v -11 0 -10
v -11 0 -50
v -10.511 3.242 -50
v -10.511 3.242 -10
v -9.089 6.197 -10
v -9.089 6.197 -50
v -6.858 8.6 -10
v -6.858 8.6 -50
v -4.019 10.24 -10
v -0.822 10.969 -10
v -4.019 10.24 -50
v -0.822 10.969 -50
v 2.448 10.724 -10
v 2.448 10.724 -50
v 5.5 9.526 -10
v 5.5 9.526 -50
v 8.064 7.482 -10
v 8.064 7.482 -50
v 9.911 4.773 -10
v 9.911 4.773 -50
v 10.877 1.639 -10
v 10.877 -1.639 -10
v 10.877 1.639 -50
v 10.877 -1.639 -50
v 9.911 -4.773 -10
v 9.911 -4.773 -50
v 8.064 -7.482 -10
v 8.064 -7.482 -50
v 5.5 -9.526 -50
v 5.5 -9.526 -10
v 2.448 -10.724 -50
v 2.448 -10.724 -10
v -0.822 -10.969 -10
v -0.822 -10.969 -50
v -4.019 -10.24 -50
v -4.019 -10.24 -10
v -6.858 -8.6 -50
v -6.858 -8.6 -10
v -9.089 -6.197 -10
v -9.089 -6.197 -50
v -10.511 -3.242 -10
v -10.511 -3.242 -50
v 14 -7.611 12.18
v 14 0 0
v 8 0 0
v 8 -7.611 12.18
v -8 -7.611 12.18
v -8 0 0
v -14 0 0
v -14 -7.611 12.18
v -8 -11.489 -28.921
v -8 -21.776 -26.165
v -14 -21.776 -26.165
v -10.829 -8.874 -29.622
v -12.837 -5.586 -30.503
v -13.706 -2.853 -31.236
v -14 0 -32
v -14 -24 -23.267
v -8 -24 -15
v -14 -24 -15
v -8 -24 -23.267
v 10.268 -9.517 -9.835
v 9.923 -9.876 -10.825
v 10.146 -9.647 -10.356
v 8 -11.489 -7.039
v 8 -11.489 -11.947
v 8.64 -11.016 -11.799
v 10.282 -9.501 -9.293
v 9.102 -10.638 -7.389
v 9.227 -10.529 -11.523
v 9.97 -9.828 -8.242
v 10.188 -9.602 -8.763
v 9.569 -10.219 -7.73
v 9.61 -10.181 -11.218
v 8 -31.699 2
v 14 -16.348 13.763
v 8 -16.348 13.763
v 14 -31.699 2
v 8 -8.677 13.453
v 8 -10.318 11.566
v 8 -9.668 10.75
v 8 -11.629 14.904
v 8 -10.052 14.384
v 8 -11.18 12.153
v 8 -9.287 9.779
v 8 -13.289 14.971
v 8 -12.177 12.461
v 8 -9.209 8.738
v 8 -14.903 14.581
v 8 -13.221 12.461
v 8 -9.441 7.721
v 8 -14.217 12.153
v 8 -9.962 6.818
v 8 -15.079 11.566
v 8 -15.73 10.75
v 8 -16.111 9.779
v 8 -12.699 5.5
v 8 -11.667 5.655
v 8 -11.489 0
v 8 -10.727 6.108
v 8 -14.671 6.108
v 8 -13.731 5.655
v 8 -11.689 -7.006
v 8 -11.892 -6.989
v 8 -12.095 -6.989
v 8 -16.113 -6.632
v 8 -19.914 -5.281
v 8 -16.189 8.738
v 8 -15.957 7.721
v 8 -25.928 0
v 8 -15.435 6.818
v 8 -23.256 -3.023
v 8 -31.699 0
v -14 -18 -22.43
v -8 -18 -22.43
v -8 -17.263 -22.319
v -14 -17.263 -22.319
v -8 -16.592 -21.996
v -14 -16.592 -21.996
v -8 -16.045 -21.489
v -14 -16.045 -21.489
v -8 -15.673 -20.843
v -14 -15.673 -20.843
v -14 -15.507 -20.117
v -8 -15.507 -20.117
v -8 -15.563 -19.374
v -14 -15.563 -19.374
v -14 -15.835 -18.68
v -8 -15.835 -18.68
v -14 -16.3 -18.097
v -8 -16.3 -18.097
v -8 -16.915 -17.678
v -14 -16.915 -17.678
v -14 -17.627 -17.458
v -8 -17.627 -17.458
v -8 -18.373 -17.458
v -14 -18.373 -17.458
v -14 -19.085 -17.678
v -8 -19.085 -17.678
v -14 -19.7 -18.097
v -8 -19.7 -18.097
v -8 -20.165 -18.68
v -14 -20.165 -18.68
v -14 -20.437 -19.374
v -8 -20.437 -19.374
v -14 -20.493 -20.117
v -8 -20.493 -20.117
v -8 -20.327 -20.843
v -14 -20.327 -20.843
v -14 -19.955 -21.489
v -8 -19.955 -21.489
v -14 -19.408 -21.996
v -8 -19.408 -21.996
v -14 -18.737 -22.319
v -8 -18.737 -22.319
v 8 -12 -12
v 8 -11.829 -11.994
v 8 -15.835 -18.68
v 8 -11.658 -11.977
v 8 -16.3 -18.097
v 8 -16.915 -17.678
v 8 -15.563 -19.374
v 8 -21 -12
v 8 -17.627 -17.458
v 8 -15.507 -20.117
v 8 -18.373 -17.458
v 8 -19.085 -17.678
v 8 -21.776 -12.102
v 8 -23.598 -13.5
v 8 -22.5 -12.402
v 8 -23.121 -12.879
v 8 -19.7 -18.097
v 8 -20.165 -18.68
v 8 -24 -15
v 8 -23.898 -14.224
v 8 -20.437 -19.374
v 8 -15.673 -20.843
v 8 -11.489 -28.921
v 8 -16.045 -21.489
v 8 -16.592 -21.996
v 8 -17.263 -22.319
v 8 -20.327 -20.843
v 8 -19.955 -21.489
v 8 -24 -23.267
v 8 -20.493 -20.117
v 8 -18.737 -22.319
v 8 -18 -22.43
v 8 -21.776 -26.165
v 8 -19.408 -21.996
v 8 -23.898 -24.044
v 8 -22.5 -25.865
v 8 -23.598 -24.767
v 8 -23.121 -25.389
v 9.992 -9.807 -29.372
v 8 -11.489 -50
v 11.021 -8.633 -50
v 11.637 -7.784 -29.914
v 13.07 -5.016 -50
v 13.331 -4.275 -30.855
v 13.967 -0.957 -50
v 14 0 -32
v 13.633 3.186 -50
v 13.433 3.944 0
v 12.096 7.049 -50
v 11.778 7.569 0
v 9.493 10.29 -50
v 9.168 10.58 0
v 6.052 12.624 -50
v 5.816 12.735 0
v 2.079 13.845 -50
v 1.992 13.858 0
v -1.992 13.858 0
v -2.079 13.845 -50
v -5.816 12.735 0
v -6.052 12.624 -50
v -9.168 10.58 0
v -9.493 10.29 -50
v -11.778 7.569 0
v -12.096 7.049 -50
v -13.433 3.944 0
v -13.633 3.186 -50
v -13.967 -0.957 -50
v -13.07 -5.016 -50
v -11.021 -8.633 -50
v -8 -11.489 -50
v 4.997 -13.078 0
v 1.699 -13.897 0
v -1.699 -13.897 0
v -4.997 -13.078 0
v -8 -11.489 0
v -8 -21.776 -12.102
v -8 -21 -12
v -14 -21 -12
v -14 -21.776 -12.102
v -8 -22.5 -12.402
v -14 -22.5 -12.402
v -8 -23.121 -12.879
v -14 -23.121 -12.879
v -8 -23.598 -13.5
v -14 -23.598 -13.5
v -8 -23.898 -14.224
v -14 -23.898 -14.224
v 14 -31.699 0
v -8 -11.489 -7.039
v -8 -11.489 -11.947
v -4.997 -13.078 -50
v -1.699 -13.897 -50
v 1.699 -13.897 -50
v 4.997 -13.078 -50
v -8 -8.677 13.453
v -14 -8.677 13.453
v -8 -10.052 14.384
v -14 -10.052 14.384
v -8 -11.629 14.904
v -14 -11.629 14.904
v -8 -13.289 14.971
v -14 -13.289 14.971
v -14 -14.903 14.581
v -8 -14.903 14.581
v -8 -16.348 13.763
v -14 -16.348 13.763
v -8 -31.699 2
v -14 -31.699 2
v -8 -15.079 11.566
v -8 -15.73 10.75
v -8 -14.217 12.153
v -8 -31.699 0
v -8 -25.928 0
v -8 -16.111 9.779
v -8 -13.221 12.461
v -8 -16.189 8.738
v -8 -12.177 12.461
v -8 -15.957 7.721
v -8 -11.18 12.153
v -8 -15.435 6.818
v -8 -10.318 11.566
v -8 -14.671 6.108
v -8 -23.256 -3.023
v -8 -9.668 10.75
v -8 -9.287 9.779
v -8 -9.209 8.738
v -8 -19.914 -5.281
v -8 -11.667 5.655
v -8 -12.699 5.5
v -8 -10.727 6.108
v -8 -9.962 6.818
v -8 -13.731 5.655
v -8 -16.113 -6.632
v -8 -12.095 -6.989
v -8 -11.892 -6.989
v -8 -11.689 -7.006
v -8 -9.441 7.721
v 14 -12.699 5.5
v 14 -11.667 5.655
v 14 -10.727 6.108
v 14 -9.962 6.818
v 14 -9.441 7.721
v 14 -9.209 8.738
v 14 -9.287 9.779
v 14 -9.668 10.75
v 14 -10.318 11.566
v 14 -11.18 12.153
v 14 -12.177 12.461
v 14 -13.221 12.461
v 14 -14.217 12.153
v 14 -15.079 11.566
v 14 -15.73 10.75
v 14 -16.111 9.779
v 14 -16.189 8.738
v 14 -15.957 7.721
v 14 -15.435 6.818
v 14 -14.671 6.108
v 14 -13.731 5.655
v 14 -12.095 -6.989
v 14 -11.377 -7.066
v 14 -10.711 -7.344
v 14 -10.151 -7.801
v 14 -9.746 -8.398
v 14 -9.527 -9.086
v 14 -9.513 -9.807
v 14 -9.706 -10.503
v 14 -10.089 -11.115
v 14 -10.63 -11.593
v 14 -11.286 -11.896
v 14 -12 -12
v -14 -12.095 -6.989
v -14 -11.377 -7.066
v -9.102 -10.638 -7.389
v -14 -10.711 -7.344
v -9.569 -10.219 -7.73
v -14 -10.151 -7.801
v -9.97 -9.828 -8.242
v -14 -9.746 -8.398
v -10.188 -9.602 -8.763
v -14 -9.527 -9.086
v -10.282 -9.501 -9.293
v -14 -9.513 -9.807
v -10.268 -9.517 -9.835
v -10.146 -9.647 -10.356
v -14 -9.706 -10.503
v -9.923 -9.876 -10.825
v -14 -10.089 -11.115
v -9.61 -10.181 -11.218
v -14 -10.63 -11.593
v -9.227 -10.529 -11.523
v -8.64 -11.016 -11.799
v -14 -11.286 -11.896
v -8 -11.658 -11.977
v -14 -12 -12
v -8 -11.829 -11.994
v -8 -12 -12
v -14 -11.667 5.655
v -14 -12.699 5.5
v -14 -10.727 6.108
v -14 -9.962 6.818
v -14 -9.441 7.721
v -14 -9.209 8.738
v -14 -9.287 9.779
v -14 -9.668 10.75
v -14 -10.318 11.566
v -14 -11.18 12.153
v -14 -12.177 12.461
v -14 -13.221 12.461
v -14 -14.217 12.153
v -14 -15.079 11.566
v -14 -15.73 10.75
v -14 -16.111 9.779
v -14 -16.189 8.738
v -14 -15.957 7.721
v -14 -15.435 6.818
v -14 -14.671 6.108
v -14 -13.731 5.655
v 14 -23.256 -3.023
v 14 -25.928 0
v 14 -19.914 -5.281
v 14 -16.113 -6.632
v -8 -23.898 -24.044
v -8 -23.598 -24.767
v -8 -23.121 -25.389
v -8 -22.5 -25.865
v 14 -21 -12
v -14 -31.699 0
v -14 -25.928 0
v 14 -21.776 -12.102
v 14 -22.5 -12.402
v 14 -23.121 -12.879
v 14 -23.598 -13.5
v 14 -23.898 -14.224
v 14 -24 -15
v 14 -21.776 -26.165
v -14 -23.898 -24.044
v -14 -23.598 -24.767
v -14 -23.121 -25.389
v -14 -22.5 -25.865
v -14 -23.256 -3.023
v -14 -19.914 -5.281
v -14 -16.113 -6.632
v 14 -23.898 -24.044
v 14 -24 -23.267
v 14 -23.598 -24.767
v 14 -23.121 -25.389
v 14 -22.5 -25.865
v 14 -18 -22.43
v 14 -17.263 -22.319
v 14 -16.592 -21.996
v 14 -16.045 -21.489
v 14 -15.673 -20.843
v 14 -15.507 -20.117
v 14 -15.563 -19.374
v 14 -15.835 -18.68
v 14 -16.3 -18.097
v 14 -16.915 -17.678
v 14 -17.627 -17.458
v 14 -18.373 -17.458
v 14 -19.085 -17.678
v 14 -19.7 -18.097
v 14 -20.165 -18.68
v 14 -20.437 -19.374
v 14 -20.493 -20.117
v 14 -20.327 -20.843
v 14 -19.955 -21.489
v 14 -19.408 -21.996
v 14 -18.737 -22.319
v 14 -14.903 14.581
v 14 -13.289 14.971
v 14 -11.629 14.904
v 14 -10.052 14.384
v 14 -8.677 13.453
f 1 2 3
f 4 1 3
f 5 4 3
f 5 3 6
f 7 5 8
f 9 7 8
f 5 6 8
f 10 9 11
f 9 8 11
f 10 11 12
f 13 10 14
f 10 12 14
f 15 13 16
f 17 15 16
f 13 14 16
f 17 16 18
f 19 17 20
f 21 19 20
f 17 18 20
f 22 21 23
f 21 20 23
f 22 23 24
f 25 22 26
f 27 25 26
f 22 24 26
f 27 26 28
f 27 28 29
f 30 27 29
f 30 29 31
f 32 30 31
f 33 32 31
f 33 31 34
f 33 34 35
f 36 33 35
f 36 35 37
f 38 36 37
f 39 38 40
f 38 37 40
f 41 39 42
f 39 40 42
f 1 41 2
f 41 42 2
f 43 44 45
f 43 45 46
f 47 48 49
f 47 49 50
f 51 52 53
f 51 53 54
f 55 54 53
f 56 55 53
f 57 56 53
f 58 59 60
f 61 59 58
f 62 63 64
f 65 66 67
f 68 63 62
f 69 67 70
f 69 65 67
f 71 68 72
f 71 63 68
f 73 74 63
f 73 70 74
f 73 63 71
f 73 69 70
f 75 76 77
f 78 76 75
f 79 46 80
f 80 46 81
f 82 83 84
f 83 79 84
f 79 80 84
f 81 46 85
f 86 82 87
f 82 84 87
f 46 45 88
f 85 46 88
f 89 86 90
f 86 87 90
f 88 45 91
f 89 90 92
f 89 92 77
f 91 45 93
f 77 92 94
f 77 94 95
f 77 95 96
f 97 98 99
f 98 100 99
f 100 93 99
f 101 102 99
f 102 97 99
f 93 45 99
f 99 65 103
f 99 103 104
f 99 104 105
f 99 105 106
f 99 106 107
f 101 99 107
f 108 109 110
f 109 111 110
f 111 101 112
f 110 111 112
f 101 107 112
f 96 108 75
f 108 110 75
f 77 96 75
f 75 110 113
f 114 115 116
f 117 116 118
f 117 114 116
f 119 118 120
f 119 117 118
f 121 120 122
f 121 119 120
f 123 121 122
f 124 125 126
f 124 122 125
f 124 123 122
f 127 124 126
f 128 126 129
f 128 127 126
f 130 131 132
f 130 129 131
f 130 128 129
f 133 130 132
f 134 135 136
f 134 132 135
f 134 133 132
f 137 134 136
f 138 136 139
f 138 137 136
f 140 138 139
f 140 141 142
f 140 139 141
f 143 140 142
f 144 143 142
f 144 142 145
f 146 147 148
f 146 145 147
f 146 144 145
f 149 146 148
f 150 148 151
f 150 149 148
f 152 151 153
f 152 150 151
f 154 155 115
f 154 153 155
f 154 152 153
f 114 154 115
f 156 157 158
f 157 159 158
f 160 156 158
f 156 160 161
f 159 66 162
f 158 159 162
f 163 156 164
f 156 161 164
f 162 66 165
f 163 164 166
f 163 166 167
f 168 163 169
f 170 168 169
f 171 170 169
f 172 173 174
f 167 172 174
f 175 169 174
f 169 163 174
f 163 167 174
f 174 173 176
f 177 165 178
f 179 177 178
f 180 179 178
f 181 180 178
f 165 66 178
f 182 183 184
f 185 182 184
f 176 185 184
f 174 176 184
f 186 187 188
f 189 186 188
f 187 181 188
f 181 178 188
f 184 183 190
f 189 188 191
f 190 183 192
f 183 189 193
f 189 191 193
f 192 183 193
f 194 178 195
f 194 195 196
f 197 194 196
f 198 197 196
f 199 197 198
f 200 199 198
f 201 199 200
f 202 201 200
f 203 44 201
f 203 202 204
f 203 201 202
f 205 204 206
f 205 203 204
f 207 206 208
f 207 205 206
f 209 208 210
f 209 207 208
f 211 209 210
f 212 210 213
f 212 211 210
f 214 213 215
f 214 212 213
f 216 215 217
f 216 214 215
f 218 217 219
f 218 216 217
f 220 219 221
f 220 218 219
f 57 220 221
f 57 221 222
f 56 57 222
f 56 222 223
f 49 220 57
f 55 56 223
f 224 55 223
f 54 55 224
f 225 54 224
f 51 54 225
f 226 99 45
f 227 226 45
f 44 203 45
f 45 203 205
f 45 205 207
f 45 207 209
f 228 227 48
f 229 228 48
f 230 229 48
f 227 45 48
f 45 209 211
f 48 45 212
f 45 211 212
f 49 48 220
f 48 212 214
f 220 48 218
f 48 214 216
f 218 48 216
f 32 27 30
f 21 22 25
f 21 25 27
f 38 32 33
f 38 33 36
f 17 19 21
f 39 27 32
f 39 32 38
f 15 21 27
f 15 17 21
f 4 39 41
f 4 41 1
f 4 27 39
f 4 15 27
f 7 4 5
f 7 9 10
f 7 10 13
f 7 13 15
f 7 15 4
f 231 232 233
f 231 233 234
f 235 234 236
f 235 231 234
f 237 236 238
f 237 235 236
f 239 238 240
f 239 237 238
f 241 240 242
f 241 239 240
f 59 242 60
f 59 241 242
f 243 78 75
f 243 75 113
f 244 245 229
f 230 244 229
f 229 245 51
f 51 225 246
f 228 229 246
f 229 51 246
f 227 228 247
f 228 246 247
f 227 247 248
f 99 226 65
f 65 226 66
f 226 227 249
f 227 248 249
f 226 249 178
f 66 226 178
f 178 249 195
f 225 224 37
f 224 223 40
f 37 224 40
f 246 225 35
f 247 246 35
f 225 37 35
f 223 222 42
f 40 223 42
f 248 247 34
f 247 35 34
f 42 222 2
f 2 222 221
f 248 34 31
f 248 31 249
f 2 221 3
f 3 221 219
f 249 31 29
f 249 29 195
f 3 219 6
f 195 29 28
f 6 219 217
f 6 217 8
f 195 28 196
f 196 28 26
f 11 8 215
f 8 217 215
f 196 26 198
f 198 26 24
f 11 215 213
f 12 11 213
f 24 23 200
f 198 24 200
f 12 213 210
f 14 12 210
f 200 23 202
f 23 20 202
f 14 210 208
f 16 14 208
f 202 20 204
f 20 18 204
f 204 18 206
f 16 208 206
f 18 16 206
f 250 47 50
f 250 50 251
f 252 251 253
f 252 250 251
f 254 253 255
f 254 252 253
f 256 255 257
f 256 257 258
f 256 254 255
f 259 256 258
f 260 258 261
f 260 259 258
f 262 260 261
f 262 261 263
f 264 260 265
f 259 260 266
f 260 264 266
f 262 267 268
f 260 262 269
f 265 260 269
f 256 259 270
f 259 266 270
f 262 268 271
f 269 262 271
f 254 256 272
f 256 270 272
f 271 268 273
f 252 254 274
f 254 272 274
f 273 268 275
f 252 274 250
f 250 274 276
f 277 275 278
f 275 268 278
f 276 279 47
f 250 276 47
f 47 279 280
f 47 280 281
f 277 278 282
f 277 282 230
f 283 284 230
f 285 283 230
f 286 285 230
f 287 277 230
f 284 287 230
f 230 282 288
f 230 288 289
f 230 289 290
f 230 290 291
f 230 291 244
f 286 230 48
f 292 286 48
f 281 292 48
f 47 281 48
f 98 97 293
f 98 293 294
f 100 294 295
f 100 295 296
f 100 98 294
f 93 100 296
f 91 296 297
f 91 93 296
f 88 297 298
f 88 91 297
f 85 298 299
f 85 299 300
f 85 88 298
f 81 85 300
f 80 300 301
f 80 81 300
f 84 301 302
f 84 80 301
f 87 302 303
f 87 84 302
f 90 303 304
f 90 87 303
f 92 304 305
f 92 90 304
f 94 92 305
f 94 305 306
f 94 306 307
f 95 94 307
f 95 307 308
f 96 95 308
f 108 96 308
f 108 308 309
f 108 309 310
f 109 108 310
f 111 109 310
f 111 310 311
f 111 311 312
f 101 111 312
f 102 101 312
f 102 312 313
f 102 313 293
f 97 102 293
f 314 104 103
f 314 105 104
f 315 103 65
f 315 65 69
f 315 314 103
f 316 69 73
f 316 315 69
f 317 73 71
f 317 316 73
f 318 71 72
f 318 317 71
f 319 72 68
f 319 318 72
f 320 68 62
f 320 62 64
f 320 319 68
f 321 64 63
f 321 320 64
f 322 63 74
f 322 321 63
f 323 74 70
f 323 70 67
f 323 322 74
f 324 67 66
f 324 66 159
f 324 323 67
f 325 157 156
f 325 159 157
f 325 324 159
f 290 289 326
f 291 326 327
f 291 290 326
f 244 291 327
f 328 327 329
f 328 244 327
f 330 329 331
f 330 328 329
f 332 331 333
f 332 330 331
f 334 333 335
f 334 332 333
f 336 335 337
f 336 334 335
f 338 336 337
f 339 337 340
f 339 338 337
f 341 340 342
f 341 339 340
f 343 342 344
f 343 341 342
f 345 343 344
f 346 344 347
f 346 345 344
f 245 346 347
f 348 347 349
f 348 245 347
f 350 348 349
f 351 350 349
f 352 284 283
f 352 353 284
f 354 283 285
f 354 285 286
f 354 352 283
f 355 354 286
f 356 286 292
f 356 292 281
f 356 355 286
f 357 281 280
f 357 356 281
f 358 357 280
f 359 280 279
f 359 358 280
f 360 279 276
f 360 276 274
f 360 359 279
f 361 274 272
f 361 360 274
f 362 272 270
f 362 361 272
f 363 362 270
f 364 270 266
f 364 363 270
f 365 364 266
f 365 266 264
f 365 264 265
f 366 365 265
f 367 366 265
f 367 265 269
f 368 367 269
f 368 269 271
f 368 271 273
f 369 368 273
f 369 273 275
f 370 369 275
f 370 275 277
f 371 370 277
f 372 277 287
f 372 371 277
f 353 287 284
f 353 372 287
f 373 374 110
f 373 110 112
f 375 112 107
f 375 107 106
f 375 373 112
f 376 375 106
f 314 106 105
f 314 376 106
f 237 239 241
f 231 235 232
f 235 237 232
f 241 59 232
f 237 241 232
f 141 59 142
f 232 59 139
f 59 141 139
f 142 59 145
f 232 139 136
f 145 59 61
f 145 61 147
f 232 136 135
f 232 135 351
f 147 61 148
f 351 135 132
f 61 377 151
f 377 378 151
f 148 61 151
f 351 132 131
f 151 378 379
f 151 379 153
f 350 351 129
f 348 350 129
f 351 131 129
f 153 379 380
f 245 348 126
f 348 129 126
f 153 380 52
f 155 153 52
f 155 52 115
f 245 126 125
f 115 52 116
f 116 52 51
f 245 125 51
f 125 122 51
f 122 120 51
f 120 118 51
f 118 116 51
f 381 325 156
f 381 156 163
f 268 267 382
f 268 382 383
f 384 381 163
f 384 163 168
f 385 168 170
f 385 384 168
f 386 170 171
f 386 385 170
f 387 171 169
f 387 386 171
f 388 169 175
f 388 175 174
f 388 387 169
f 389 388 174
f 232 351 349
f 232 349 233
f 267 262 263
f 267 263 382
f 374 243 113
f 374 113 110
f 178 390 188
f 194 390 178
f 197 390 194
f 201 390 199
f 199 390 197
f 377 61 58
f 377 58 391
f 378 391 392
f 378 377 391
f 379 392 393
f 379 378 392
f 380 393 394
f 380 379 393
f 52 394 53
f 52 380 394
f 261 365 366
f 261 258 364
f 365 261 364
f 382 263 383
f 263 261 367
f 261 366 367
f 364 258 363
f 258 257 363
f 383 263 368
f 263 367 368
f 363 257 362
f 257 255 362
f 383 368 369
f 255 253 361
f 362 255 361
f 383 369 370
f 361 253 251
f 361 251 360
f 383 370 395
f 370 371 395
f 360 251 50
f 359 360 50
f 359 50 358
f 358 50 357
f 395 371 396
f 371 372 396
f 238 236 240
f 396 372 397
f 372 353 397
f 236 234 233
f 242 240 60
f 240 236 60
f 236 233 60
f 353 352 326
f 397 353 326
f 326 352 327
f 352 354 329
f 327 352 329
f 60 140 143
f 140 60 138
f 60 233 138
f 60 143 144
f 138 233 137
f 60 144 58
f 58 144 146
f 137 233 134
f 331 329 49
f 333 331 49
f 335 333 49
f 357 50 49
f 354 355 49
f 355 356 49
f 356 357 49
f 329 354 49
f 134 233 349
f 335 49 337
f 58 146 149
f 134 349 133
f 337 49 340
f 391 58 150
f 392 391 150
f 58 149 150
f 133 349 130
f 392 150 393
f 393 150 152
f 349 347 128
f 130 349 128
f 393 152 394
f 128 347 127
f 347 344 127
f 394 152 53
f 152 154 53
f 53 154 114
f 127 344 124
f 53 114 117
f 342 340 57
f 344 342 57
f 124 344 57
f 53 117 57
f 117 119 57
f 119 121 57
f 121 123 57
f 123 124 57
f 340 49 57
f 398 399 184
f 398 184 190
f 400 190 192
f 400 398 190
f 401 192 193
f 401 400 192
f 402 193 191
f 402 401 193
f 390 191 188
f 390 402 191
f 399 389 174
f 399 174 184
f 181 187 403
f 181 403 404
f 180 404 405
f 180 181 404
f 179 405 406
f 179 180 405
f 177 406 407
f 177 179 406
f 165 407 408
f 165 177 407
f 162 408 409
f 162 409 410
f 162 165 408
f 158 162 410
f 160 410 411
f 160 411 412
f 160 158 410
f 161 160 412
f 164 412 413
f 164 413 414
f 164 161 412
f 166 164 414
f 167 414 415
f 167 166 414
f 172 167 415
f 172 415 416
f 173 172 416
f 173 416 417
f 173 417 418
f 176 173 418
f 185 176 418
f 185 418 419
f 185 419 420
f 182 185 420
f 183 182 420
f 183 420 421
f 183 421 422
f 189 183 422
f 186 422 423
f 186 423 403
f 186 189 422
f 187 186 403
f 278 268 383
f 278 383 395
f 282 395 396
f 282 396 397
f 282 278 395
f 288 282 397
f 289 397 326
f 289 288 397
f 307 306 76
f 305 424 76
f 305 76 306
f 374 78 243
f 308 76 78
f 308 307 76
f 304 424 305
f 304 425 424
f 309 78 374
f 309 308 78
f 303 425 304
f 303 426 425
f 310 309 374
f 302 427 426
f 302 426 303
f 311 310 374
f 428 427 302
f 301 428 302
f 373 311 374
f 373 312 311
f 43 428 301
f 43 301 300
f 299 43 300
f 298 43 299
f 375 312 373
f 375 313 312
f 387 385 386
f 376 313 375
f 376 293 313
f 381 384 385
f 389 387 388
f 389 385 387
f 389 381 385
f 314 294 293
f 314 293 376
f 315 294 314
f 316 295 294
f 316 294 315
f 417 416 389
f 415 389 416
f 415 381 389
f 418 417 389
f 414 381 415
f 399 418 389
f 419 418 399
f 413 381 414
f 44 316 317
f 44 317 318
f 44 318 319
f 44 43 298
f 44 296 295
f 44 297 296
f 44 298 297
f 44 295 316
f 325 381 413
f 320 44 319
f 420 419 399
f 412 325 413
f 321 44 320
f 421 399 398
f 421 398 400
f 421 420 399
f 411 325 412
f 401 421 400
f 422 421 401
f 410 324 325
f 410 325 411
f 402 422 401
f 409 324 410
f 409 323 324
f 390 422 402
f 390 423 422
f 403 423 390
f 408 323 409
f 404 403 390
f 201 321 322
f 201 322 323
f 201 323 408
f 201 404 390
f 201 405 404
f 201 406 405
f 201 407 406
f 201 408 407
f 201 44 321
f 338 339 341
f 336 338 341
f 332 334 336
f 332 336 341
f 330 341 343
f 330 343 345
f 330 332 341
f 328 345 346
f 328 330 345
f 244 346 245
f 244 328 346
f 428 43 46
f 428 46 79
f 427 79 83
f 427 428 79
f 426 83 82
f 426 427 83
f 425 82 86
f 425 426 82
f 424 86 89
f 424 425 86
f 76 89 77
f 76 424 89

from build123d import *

# Parameters (mm, degrees)
SKETCH1_R               = 14
BOSS_EXTRUDE1_DEPTH     = 50
SKETCH2_R               = 3.5
SKETCH2_R_2             = 2.5
BOSS_EXTRUDE2_DEPTH     = 14
CUT_EXTRUDE3_DEPTH      = 61.834364638
CUT_EXTRUDE3_DEPTH_BACK = 61.834364638
CUT_EXTRUDE4_START      = 57
CUT_EXTRUDE4_DEPTH      = 57
SKETCH6_R               = 11
CUT_EXTRUDE5_DEPTH      = 40


with BuildPart() as part:
    # Sketch1 → Boss-Extrude1 (new body)
    with BuildSketch(Plane.XY):
        Circle(SKETCH1_R)
    extrude(amount=-BOSS_EXTRUDE1_DEPTH)

    # Sketch2 → Boss-Extrude2 (add, symmetric)
    with BuildSketch(Plane(origin=(0, 0, 0), x_dir=(0, 0, -1), z_dir=(1, 0, 0))):
        with BuildLine():
            Line((15, -24), (23.267238418, -24))
            ThreePointArc((23.267238418, -24), (25.093522705, -23.380060021), (26.165015897, -21.776457135))
            Line((26.165015897, -21.776457135), (32, 0))
            Line((32, 0), (0, 0))
            Line((0, 0), (-12.179515585, -7.61060601))
            ThreePointArc((-12.179515585, -7.61060601), (-14.903885139, -11.629249661), (-13.762573354, -16.348263718))
            Line((-13.762573354, -16.348263718), (-2, -31.698894587))
            Line((-2, -31.698894587), (0, -31.698894587))
            Line((0, -31.698894587), (0, -25.927651143))
            ThreePointArc((0, -25.927651143), (5.280940814, -19.913790946), (6.988586602, -12.094660803))
            ThreePointArc((6.988586602, -12.094660803), (9.446060431, -9.493846328), (12, -12))
            Line((12, -12), (12, -21))
            ThreePointArc((12, -21), (12.878679656, -23.121320344), (15, -24))
        make_face()
        with Locations((-9, -12.698894587)):
            Circle(SKETCH2_R, mode=Mode.SUBTRACT)
        with Locations((19.929981273, -18)):
            Circle(SKETCH2_R_2, mode=Mode.SUBTRACT)
    extrude(amount=BOSS_EXTRUDE2_DEPTH, both=True)

    # Sketch4 → Cut-Extrude3 (cut, two sides: drawn at the far end of the back side and taken through both)
    with BuildSketch(Plane.XY.offset(-CUT_EXTRUDE3_DEPTH_BACK)):
        with BuildLine():
            Line((-8, -31.698894587), (-8, -11.489125293))
            ThreePointArc((-8, -11.489125293), (0, -14), (8, -11.489125293))
            Line((8, -11.489125293), (8, -31.698894587))
            Line((8, -31.698894587), (-8, -31.698894587))
        make_face()
    extrude(amount=CUT_EXTRUDE3_DEPTH + CUT_EXTRUDE3_DEPTH_BACK, mode=Mode.SUBTRACT)

    # Sketch5 → Cut-Extrude4 (cut)
    with BuildSketch(Plane.XY.offset(CUT_EXTRUDE4_START)):
        with BuildLine():
            Line((-8, 0), (8, 0))
            Line((8, 0), (8, -11.489125293))
            ThreePointArc((8, -11.489125293), (0, -14), (-8, -11.489125293))
            Line((-8, -11.489125293), (-8, 0))
        make_face()
    extrude(amount=-CUT_EXTRUDE4_DEPTH, mode=Mode.SUBTRACT)

    # Sketch6 → Cut-Extrude5 (cut)
    with BuildSketch(Plane(origin=(0, 0, -50), x_dir=(-1, 0, 0), z_dir=(0, 0, -1))):
        Circle(SKETCH6_R)
    extrude(amount=-CUT_EXTRUDE5_DEPTH, mode=Mode.SUBTRACT)


solid = part.part
